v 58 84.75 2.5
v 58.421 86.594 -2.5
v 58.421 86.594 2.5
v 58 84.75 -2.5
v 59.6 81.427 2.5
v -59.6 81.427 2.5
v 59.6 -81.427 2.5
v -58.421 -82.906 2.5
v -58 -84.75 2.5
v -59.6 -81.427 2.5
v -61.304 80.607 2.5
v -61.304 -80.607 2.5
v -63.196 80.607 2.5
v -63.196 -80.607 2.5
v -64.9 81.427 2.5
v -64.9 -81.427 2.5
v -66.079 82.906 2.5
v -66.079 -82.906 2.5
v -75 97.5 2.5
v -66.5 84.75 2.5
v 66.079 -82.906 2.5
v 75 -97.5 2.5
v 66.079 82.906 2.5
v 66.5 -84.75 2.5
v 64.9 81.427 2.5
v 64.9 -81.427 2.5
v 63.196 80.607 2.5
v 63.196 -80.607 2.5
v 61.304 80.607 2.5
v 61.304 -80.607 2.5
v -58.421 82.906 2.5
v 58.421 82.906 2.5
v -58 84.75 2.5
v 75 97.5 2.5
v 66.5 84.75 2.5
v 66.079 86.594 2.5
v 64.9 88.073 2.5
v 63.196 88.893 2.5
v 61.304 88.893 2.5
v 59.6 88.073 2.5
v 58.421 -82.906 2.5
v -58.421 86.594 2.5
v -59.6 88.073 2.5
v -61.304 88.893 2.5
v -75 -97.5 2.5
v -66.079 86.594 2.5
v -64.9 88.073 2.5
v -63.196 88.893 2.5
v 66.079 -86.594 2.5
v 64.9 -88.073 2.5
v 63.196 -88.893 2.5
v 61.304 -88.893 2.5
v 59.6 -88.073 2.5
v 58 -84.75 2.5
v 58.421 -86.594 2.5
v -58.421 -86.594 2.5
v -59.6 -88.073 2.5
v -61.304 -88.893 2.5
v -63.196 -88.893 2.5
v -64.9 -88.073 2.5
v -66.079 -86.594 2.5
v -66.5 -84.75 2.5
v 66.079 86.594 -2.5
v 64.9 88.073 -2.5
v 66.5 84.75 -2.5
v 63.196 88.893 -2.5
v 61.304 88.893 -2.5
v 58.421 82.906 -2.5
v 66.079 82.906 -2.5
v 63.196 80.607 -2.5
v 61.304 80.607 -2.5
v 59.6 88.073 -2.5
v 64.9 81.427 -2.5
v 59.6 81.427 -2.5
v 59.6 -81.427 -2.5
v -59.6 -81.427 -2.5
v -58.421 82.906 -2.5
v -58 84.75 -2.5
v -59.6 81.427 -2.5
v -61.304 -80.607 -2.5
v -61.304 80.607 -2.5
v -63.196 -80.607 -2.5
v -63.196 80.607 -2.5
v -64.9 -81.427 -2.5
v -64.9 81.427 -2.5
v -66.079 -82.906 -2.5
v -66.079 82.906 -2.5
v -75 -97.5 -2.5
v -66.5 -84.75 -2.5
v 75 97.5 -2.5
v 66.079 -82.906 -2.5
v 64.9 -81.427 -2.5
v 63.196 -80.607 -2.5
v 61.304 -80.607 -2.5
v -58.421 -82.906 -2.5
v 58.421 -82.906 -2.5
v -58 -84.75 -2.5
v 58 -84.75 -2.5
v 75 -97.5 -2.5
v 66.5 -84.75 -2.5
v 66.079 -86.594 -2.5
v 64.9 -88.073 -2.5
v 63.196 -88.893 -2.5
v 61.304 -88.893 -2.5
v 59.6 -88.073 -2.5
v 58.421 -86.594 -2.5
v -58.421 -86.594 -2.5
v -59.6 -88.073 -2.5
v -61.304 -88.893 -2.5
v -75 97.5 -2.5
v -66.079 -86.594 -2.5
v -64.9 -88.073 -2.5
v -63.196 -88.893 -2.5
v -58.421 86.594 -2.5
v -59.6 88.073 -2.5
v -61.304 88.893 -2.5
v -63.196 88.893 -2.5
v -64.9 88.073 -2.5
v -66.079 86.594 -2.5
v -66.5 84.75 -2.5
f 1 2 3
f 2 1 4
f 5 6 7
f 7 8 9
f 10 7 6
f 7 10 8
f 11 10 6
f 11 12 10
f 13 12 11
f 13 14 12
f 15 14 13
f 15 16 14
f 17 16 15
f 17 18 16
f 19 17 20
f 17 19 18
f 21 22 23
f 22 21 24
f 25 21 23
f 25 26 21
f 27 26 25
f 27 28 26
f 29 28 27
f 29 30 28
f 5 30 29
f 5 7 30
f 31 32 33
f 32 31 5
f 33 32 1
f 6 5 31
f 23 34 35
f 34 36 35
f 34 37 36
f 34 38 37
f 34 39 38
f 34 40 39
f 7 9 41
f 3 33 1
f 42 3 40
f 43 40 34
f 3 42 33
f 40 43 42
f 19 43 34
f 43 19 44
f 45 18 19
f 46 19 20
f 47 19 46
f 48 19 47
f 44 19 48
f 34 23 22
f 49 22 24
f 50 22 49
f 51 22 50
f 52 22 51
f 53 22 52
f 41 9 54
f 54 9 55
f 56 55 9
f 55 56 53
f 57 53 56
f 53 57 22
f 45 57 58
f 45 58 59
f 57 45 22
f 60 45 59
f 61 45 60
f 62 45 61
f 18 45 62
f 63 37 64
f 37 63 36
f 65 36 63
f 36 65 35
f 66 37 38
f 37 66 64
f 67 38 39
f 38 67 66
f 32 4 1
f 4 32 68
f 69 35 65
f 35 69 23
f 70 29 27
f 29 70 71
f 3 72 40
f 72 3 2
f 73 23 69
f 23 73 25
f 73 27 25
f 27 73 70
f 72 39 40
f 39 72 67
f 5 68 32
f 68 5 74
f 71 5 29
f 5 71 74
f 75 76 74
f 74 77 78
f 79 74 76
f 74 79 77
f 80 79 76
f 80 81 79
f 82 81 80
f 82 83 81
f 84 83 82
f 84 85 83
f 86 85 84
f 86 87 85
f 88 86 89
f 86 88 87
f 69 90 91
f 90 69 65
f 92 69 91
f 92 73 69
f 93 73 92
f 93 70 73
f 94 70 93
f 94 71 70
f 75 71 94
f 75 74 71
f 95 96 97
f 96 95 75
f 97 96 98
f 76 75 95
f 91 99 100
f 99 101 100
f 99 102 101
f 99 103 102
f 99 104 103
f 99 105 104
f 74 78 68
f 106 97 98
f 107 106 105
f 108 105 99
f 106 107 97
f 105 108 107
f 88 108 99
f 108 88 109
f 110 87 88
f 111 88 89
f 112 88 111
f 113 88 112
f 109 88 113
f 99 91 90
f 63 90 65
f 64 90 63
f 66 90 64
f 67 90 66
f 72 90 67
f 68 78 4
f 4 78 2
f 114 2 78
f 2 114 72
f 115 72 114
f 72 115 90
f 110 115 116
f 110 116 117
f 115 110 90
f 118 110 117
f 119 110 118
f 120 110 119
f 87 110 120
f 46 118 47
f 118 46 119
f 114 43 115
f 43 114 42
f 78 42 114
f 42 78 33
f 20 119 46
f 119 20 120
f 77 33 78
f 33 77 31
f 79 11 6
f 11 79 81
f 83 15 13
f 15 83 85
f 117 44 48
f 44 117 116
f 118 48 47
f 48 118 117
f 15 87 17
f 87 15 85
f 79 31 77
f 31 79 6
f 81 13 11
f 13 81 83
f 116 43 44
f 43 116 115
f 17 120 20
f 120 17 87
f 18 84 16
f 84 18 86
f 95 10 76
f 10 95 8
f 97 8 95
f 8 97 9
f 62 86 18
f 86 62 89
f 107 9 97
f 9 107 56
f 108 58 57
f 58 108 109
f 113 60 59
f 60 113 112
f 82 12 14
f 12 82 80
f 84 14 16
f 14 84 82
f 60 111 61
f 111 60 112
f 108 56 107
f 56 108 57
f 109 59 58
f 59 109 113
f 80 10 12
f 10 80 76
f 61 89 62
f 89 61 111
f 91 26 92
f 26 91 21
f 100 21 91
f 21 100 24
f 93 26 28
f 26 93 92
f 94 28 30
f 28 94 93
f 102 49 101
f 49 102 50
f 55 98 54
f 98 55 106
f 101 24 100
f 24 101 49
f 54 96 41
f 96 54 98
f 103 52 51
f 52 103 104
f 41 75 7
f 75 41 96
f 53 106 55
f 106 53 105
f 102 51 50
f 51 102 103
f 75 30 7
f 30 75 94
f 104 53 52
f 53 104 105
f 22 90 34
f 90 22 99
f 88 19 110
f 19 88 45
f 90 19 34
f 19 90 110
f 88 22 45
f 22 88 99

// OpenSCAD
// Generated by SolidPython 1.1.3 on 2023-10-16 12:12:56


difference() {
	cube(center = true, size = [150, 195.0000000000, 5]);
	union() {
		translate(v = [62.2500000000, 84.7500000000]) {
			cylinder(center = true, h = 5, r = 4.2500000000);
		}
		translate(v = [-62.2500000000, 84.7500000000]) {
			cylinder(center = true, h = 5, r = 4.2500000000);
		}
		translate(v = [-62.2500000000, -84.7500000000]) {
			cylinder(center = true, h = 5, r = 4.2500000000);
		}
		translate(v = [62.2500000000, -84.7500000000]) {
			cylinder(center = true, h = 5, r = 4.2500000000);
		}
	}
}
/***********************************************
*********      SolidPython code:      **********
************************************************
 
import solid
import numbers
import pudb
from solid.utils import *
import viewscad
import subprocess
import os
import os.path as osp
import math
import sys

chamfer_extrude=solid.import_scad("./chamfer_extrude.scad")
chamfer_extrude=chamfer_extrude.chamfer_extrude
r = viewscad.Renderer(width=800, height=800)

def debug(model,f_name,path="/home/ts/code/projects/mfd/designs/debug"):
    solid.scad_render_to_file(model,osp.join(path,f_name)+".scad")
#generate position list of wells using offset from center
wells_pos_from_center_4 = lambda offset: [[-offset,offset],
                                        [offset, offset],
                                        [-offset, -offset],
                                        [offset, -offset]]
#wells_pos_from_center_2 = lambda offset: [[0,offset],
#                                        [0, -offset]]
wells_pos_from_center_2 = lambda offset: [[offset,0],
                                        [-offset,0]]

def make_well(dims,shape=None,height=None,dxf=False):
    def circle_cylinder():
        if dxf or (height is None):
            well = solid.circle(r=dims, segments=64)
        else:
            well = solid.cylinder(r=dims, h=height, segments=64, center = True)
        return well
    if dims is None:
        sys.exit("radius needs to be a number")
    if isinstance(dims, numbers.Number):
        well =circle_cylinder()
    elif len(dims)==1:
        if isinstance(dims[1], numbers.Number):
            well =circle_cylinder()
        else:
            sys.exit("radius needs to be a number")
    elif len(dims)==2:
        well = solid.square(dims,center = True)
    elif len(dims)==3:
        well = solid.cube(dims, center = True)
    return well

def wells_top_bottom(center_gap,device_dims=None,shape=None,height=None, positions = None, dxf = False):
    well_shape = make_well(device_dims,shape=shape,height=height,dxf=dxf)
    wells = []
    if positions is None:
        offset = radius+radius/2.0
        positions = wells_pos_from_center_2(offset)
    if dxf or (height is None):
        height = 0
    for position in positions:
        if dxf:
            wells.append(solid.translate([position[0],position[1]])(well_shape))
        else:
            wells.append(solid.translate([position[0],position[1],height/2.0])(well_shape))
    return  union()(*wells)

#place wells in four corners 
def four_corner(radius,height=None, positions = None, dxf = False):
    #if well pos not specified set
    #to equally spaced by half radius
    if positions is None:
        offset = radius+radius/2.0
        positions = wells_pos_from_center_4(offset)
    if dxf or (height is None):
        height = 0
    #make wells at positions with specified radius and height
    wells = []
    for position in positions:
        #make circle if making dxf
        if dxf:
            well_shape = solid.circle(r=radius, segments=64)
            well_shape = solid.translate([position[0],position[1]])(well_shape)
        #if stl make cylinder
        else:
            well_shape = solid.cylinder(r=radius, h=height, segments=64, center = True)
            well_shape = solid.translate([position[0],position[1],height/2.0])(well_shape)
        wells.append(well_shape)
    return  union()(*wells)

#generate channels 
def make_channels(length,width,height=0,num_chans=1,max_chans=None,spacing=None, dxf = False,
                  rotate_channels=False):
    if dxf or (height is None):
        height = 0
    #if channel gap not defined, is equal to
    if spacing is None: spacing = width
    #calculate number of channels if fitting max num within given width
    if not max_chans is None:
        import math
        num_chans = math.floor((max_chans-spacing)/(width+spacing))
    #get total width of channel section  
    total_width = (width*num_chans)+(spacing*(num_chans-1))

    #make template channel
    #if rotate_channels: width, length = length, width
    if dxf:
        channel_t = solid.square([length,width],center = True)
    else:
        channel_t = solid.cube([length,width,height], center = True)

    #if number channels is even, offset the first channel to center its gap
    if num_chans % 2 == 0: centering = -(width/2.0+spacing/2.0)
    else: centering = 0
    #move template channel up to align bottom at z = 0 
    #and offset center if necessary
    if dxf:
        channel_t = solid.translate([0,centering])(channel_t)
    else:
        channel_t = solid.translate([0,centering,height/2.0])(channel_t)

    #if rotate_channels: length,width = width,length
    #start making the channels
    channels = []
    for i in range(num_chans):
        #if i=0 there is no translation
        #if i=1, we make the first channel adjacent to second
        direction = i

        #if i>=1, we add channels alternating left and right
        if i >= 1:
            direction = -(i/2.0)
            if i % 2 == 1: direction = (-direction)+0.5
                
        #make channel at right position and add it to channel list
        translation_coords = [0,direction*(width+spacing)]
        #if rotate_channels: translation_coords = [direction*(width+spacing),0]
        if dxf:
            channel = solid.translate(translation_coords)(channel_t)
        else:
            channel = solid.translate([*translation_coords,0])(channel_t)
        channels.append(channel)
    
    #group all channels as one object
    channels = union()(*channels)
    #compute the x,y,z dimensions in order to pass as arguments 
    #for construction of other parts of device (such as the chambers)
    measurements = {'x':(length/2.0,-length/2.0),
                    'y':(total_width/2.0,-total_width/2.0)}
    if not dxf:
        measurements['z'] = (height,0)
    if rotate_channels:
        channels = solid.rotate(90)(channels)
        measurements['x'],measurements['y']=measurements['y'],measurements['x']
    return channels,measurements

def make_chambers(msrs,height=None,extra=0,len_until=None,width=None, dxf = False):
    #computes x,y,z length
    total = lambda x : abs(x[0]) + abs(x[1])
    
    #if specific height if specified
    #otherwise use same height as channels
    if dxf:
        pass
    elif not height is None:
        msrs['z'] = (height,0)
    else:
        msrs['z'] = (0,0)
        
    #make copy of measurements from channels to modify chamber dimensions 
    #and add length to chambers as specified
    chamber_dims = msrs.copy()
    #calculate length of chamber to reach specified offset
    if not len_until is None:
        chamber_len = len_until-(msrs['x'][0])
    #or add specified length to channel length (if not specified, adds 0)
    else:
        chamber_len = msrs['x'][0]+extra
    #set the chamber length based 
    chamber_dims['x'] = (chamber_len/2.0,-(chamber_len/2.0))
    #compute final dimensions of chamber
    if not width is None:
        chamber_dims['y'] = (width/2.0,-width/2.0)
    chamber_dims = [total(size) for size in chamber_dims.values()]
        
    #calculate chamber translation offset to place adjacent to channels
    chamber_trslt = msrs['x'][0]+(chamber_len/2.0)
    #compute chamber translation coordinates to align with channels
    #x = 1 moves chamber above channels
    #x = -1 moves chamber below channels
    if dxf:
        trslt = lambda x : [x*(chamber_trslt),0]
    else:
        trslt = lambda x : [x*(chamber_trslt),0,msrs['z'][0]/2.0]
    
    #function to make chamber at top or at bottom 
    if dxf:
        move = lambda x : solid.translate(trslt(x))(solid.square(chamber_dims, center = True) )
    else:
        move = lambda x : solid.translate(trslt(x))(solid.cube(chamber_dims,center = True))
    #make top and bottom chambers and return them as grouped
    top = move(1)
    bottom = move(-1)
    #chambers=solid.rotate(90)(solid.union()(top,bottom))
    chambers=(solid.union()(top,bottom))

    return chambers

#create alignment features 
def alignment_features(unit,dims,grid_size, mask_size = None, alignment = "hollow", units_from_center = (2.5,2.5), corner_len=None):
    width = grid_size[0]*dims[0]
    length = grid_size[1]*dims[1]
    if mask_size is None and corner_len is None:
        corner_len = (dims[0] + dims[1]) /2 / 8
    corner = lambda thickness_div : solid.union()( solid.square([corner_len,corner_len/thickness_div],center=False), solid.square([corner_len/thickness_div,corner_len],center=False) )
    
    def make_full(thickness_div):
        thickness = corner_len/thickness_div
        tr = solid.translate([0, 0, 0 ])(solid.rotate(180)(corner(thickness_div)))
        tr = solid.translate([thickness/2,thickness/2,0])(tr)
        bl = solid.translate([0, 0, 0 ])(solid.rotate(0)(corner(thickness_div)))
        bl = solid.translate([-thickness/2,-thickness/2,0])(bl)
        return solid.union()(tr,bl)
    
    def make_hollow(thickness_div):
        thickness = corner_len/(thickness_div/2)
        inner = make_full(thickness_div)
        outer = make_full(thickness_div/2)
        hollow = outer - inner 
        return hollow
    
    center = (width /2 , length/2)
    mask_pos = lambda x,y : (center[0] + x*(float(units_from_center[0])*dims[0]), center[1] + y*(float(units_from_center[1])*dims[1]))
    positions = []
    positions.append(mask_pos(1,0))
    positions.append(mask_pos(0,1))
    positions.append(mask_pos(-1,0))
    positions.append(mask_pos(0,-1))
    make_mask = lambda mtype : make_hollow(8) if mtype == "hollow" else make_full(8)
    masks = [ solid.translate([*position,0])(make_mask(alignment)) for position in positions]
    
    solid.scad_render_to_file(solid.union()(*masks),"./designs/open_chamber/masks.scad")
    #return unit - solid.union()(*masks)
    return solid.union()(*masks,unit)

def create_outline(thickness, array, dims, grid_size,):
    width = grid_size[0]*dims[0] + thickness *2
    length = grid_size[1]*dims[1] + thickness *2
    outer = solid.translate([-thickness, -thickness,0])(solid.square([width, length]))
    return outer-array

def create_wall(wall_thickness, outline_thickness, dims, grid_size, wall_height = 2000, dxf = False):
    inner_width = grid_size[0]*dims[0] + outline_thickness *2
    inner_length = grid_size[1]*dims[1] + outline_thickness *2
    outer_width = inner_width + wall_thickness * 2
    outer_length = inner_length + wall_thickness * 2
    outer_pos_x = -outline_thickness-wall_thickness
    outer_pos_y = -outline_thickness-wall_thickness
    inner_pos_x = -outline_thickness
    inner_pos_y = -outline_thickness
    if dxf:
        inner_wall = solid.translate([inner_pos_x,
                                      inner_pos_y,
                                      0])(solid.square([inner_width, inner_length]))
        outer_wall = solid.translate([outer_pos_x,
                                      outer_pos_y,
                                      0])(solid.square([outer_width, outer_length]))

        return outer_wall-inner_wall
    else:
        inner_wall = solid.translate([inner_pos_x,
                                      inner_pos_y,
                                      0])(solid.cube([inner_width, inner_length,wall_height]))
        outer_wall = solid.translate([outer_pos_x,
                                      outer_pos_y,
                                      0])(solid.cube([outer_width, outer_length,wall_height]))

        return outer_wall-inner_wall, {'wall_height': wall_height,
                                       'wall_thickness': wall_thickness,
                                       'inner_width':inner_width,
                                       'inner_length': inner_length,
                                       'outer_width': outer_width,
                                       'outer_length': outer_length,
                                       'outer_pos_x' : outer_pos_x,
                                       'outer_pos_y' : outer_pos_y,
                                       'inner_pos_x' : inner_pos_x,
                                       'inner_pos_y' : inner_pos_y}

def create_thicker_wall(wall_thickness, outer_wall_offset, wall_dims, dims, grid_size, height_start = .2, height_end=2, dxf = False):
    addon_wall,thicker_wall_dims = create_wall(wall_thickness, outer_wall_offset, dims, grid_size, wall_height=height_end-height_start, dxf = False)
    addon_wall = solid.translate([0,0,height_start])(addon_wall)

    thicker_wall_dims['wall_height'] = height_end
    thicker_wall_dims['wall_thickness'] = wall_dims['wall_thickness'] + wall_thickness
    return addon_wall, thicker_wall_dims
 
def add_lock_to_wall(wall,wall_dims,y_offset = 0,cut_ratio=0.7,L_length=3, gap_ratio=0.05, axis="x",width_ratio=1/2):
    # Makes L shape
    def make_L(max_length,length_thickness,max_width,width_thickness,height,y_offset):
        length = solid.cube([max_length,length_thickness,height])
        width = solid.cube([width_thickness,max_width,height])
        width = solid.translate([max_length-(width_thickness),0,0])(width)
        L = solid.union()(width,length)
        debug(L,"L")
        if axis == "x":
            L = solid.rotate(-90)(L)
            L = solid.translate([0,max_length,0])(L)
        else:
            L = solid.rotate(-180)(L)
            L = solid.translate([max_length,max_width,0])(L)
        return solid.translate([0,0,y_offset])(L)
    
    lock_length = L_length
    lock_width = wall_dims['wall_thickness']*width_ratio
    lock_length_thickness = lock_width/2
    lock_width_thickness = lock_width/2
    L_lock = make_L(lock_length,lock_length_thickness,lock_width,lock_width_thickness, wall_dims['wall_height']-y_offset, y_offset)
    
    margin_space = lock_length - lock_length*(1-gap_ratio)
    key_length = lock_length-margin_space
    key_length_thickness = lock_length_thickness-(margin_space*2)
    key_width = lock_width-(margin_space*2)
    key_width_thickness = lock_width_thickness-(margin_space*2)
    L_key = make_L(key_length,key_length_thickness,key_width,key_width_thickness, wall_dims['wall_height']-y_offset, y_offset)
    L_key = solid.translate([margin_space,margin_space,0])(L_key)
    L = solid.union()(L_lock,L_key)
    debug(L,"L")
    
    #Make cube to be used as negative to split frame in a half
    #Can choose if making left or right negative, specify ratio of split
    def make_negative(right,cut_ratio):
        if axis == "x":
            if right:
                length = wall_dims['outer_length']*(1-cut_ratio)
                pos_x = wall_dims['outer_pos_x']+(wall_dims['outer_length']*cut_ratio)
            else:
                length = wall_dims['outer_length']*(cut_ratio)
                pos_x = wall_dims['outer_pos_x'] 
            negative = solid.cube([wall_dims['outer_width'],length, wall_dims['wall_height']])
            negative = solid.translate([wall_dims['outer_pos_y'],pos_x,0])(negative)
        else:
            if right:
                length = wall_dims['outer_width']*(1-cut_ratio)
                pos_x = wall_dims['outer_pos_y']+(wall_dims['outer_width']*cut_ratio)
            else:
                length = wall_dims['outer_width']*(cut_ratio)
                pos_x = wall_dims['outer_pos_y'] 
            negative = solid.cube([length,wall_dims['outer_length'], wall_dims['wall_height']])
            negative = solid.translate([pos_x,wall_dims['outer_pos_x'],0])(negative)
        return negative, pos_x, length 
                      
    #Make negatives
    negative_right, right_half_pos_x, right_half_length = make_negative(True,cut_ratio)
    negative_left, left_half_pos_x, right_half_length = make_negative(False,cut_ratio)
    #Make halves
    left_half = solid.difference()(wall,negative_right)
    right_half = solid.difference()(wall,negative_left)
    def place_L(L, L_length,L_width):
        #Place L on top wall       
        offset_to_center = (wall_dims['wall_thickness']-L_width)/2
        if axis == "x":
            y_pos_top = (wall_dims['outer_pos_y'] +
                    wall_dims['outer_width'] - 
                    L_width - offset_to_center)
            top_L = solid.translate([y_pos_top,
                                     right_half_pos_x-(L_length),
                                     0])(L)
            #Place L on bottom wall       
            y_pos_bottom = wall_dims['outer_pos_y']+offset_to_center
            bottom_L = solid.translate([y_pos_bottom,
                                        right_half_pos_x-L_length,
                                        0])(L)
        else:
            y_pos_top = (wall_dims['outer_pos_x'] +
                    wall_dims['outer_length'] -
                    (L_width+offset_to_center))
            top_L = solid.translate([right_half_pos_x-L_length,
                                     y_pos_top,
                                     0])(L)
            #Place L on bottom wall       
            y_pos_bottom = wall_dims['outer_pos_y']+offset_to_center
            bottom_L = solid.translate([right_half_pos_x-L_length,
                                        y_pos_bottom,
                                        0])(L)
        return bottom_L, top_L
    #Make complimentary L pieces through union and differences
    #Make Lock
    bottom_L_lock, top_L_lock = place_L(L_lock,L_length,lock_width)
    left_half = solid.difference()(left_half,bottom_L_lock)
    left_half = solid.difference()(left_half,top_L_lock)
    #Make Key
    bottom_L_key, top_L_key = place_L(L_key,L_length,lock_width)
    right_half = solid.union()(right_half,bottom_L_key)
    right_half = solid.union()(right_half,top_L_key)
    return left_half, right_half


#build a row x col grid of containment units
def make_unit_array(unit,dims,grid_size, dxf = False, alignment = None, mask_size = None,
                    units_from_center = None,alignment_offset=None, alignment_mark_size=1):
    units = []
    for col in range(grid_size[1]):
        for row in range(grid_size[0]):
            if dxf:
                units.append(solid.translate([row*dims[0],col*dims[1]])(unit))
            else:
                units.append(solid.translate([row*dims[0],col*dims[1],dims[2]/2.0])(unit))
    array = solid.union()(*units)
    if (not alignment is None) and dxf:
        if not alignment_offset is None:
            array = solid.translate([alignment_offset[0],alignment_offset[1]])(array)
        array = alignment_features(array,dims, grid_size, alignment = alignment, mask_size = None, units_from_center = units_from_center,corner_len=alignment_mark_size)
        if not alignment_offset is None:
            array = solid.translate([-alignment_offset[0],-alignment_offset[1]])(array)
    return array


def make_taylor(wells_pos = wells_pos_from_center_4(2.25), well_rad = 1.5 ,
                well_height = 2, chan_w = 0.01, chan_l = 1, chan_h = 0.010 ,
                chan_gap = 0.040, max_chans = None,num_chans=100, chamber_height  = 0.100,
                columns = 1, rows = 1, chamber_len_until=2.25, add_channels = True, add_wells = True, 
                add_chambers = True, save_path = "./", alignment = None, units_from_center = 2,
                mask_size = None, render_stl = False, outline_thickness = 0.050, dxf = True,
                wall_height = 15, wall_thickness = 0.95, casing_x=9, casing_y=9, casing_z=0,rotate_units=0):

    dims = [casing_x, casing_y, casing_z]
    wells = four_corner(well_rad,well_height, dxf = dxf, positions = wells_pos)
    debug(wells,"wells")
    channels, msrs = make_channels(chan_l,chan_w,chan_h,dxf=dxf, spacing = chan_gap, max_chans=max_chans,num_chans=num_chans)
    debug(channels,"channels")
    chambers = make_chambers(msrs,dxf = dxf, height=chamber_height,len_until=chamber_len_until)
    debug(chambers,"chambers")

    #add together and render
    device_parts = []
    if add_channels:
        device_parts.append(channels)
    if add_wells:
        device_parts.append(wells)
    if add_chambers:
        device_parts.append(chambers)
    device=union()(*device_parts)
    device = rotate(rotate_units)(device)

    device=solid.translate([dims[0]/2.0,dims[1]/2.0,0])(device)
    channels = rotate(rotate_units)(channels)
    channels=solid.translate([dims[0]/2,dims[1]/2,0])(channels)
    chambers_wells = union()(wells,chambers)
    chambers_wells = rotate(rotate_units)(chambers_wells)
    chambers_wells=solid.translate([dims[0]/2,dims[1]/2,0])(chambers_wells)

    file_name = str(rows)+'x'+str(columns)+'_units_'
    grid_size = [rows,columns]

    if alignment:
        alignment="full"
    device = make_unit_array(device,dims,grid_size, dxf=dxf, alignment = alignment,
                                 units_from_center = units_from_center)
    channels = make_unit_array(channels,dims,grid_size, dxf=dxf, alignment = alignment,
                                 units_from_center = units_from_center)
    if alignment=="full":
        alignment="hollow"

    chambers_wells = make_unit_array(chambers_wells,dims,grid_size, dxf=dxf, alignment = alignment,
                                 units_from_center =units_from_center)

    def save_model(model,prefix):
        model_fname = os.path.abspath(save_path+prefix+"_"+file_name+".scad")
        solid.scad_render_to_file(model,model_fname)
        return model_fname

    wells_fname = save_model(wells,"wells")
    channels_fname = save_model(channels,"channels")
    device_fname = save_model(device,"device")
    chambers_wells_fname = save_model(chambers_wells,"chambers_wells")
    return (chambers_wells,chambers_wells_fname), (channels,channels_fname), (device,device_fname)

def make_device(design='open',rows=8,columns=6,wells_pos = 4.5,well_offset=3.2, well_rad=3.2,well_height=0.1,
                chan_l=1,chan_w=0.01,chan_h=0.01,chan_gap=0.015,num_chans=101,dxf=True,save_path="./designs/open_chamber/",
                casing_x=9.0,casing_y=18.0,casing_z=0,rotate_units=90,units_from_center=(3,1),chamber_len_until=4.5,
                chamber_width=None,alignment=True, add_wells=True, add_channels=True,add_chambers=True):

    dims = [casing_x, casing_y, casing_z]
    if design == "open":
        wells_pos=wells_pos_from_center_2(wells_pos)
        wells = wells_top_bottom(well_offset*2,device_dims=well_rad,height=well_height, dxf = dxf, positions = wells_pos)
    elif design == "closed":
        wells_pos=wells_pos_from_center_4(wells_pos)
        debug(wells,"wells")
        wells = four_corner(well_offset,well_heightdevice_dims=well_rad, dxf = dxf, positions = wells_pos)
    else:
        print(design+" is not a valid design.\n Choose valid design: 'open' or 'closed'")
        exit()
    wells = rotate(rotate_units)(wells)
    wells=solid.translate([dims[0]/2,dims[1]/2,0])(wells)
    debug(wells,"wells")

    channels, msrs = make_channels(chan_l,chan_w,chan_h,dxf=dxf, spacing = chan_gap, num_chans=num_chans,rotate_channels=False)
    channels = rotate(rotate_units)(channels)
    channels=solid.translate([dims[0]/2,dims[1]/2,0])(channels)

    chambers=make_chambers(msrs,height=None,extra=0,len_until=chamber_len_until, width=chamber_width,dxf = dxf)
    chambers = rotate(rotate_units)(chambers)
    chambers=solid.translate([dims[0]/2,dims[1]/2,0])(chambers)

    device_parts = []
    if add_channels:
        device_parts.append(channels)
    if add_wells:
        device_parts.append(wells)
    if add_chambers:
        device_parts.append(chambers)
    device = union()(*device_parts)
    #device = rotate(rotate_units)(device)
    #device=solid.translate([dims[0]/2.0,dims[1]/2.0,0])(device)

    chambers_wells = []
    if add_chambers:
        chambers_wells.append(chambers)
    if add_wells:
        chambers_wells.append(wells)
    chambers_wells = union()(*chambers_wells)
    #chambers_wells = union()(wells,chambers)
    #chambers_wells = rotate(rotate_units)(chambers_wells)
    #chambers_wells=solid.translate([dims[0]/2,dims[1]/2,0])(chambers_wells)

    file_name = str(rows)+'x'+str(columns)+'_units_'

    grid_size = [rows,columns]
    if alignment:
        alignment="full"
    device = make_unit_array(device,dims,grid_size, dxf=dxf, alignment = alignment,
                                 units_from_center = units_from_center)
    channels = make_unit_array(channels,dims,grid_size, dxf=dxf, alignment = alignment,
                                 units_from_center = units_from_center)
    if alignment=="full":
        alignment="hollow"

    chambers_wells = make_unit_array(chambers_wells,dims,grid_size, dxf=dxf, alignment = alignment,
                                 units_from_center =units_from_center)

    def save_model(model,prefix):
        model_fname = os.path.abspath(save_path+prefix+"_"+file_name+".scad")
        solid.scad_render_to_file(model,model_fname)
        return model_fname

    wells_fname = save_model(wells,"wells")
    channels_fname = save_model(channels,"channels")
    device_fname = save_model(device,"device")
    chambers_wells_fname = save_model(chambers_wells,"chambers_wells")
    return (chambers_wells,chambers_wells_fname), (channels,channels_fname), (device,device_fname)


def make_open_chamber(rows=8,columns=6,wells_pos = wells_pos_from_center_2(4.5), well_rad=3.2,well_height=0.1,
                      chan_l=1,chan_w=0.01,chan_h=0.01,chan_gap=0.015,num_chans=101,dxf=True,save_path="./designs/open_chamber/",
                      casing_x=9.0,casing_y=18.0,casing_z=0,rotate_units=90,units_from_center=(3,1),chamber_len_until=4.5,
                      chamber_width=None,alignment=True, add_wells=True, add_channels=True,add_chambers=True):

    dims = [casing_x, casing_y, casing_z]
    wells = wells_top_bottom(well_rad,height=well_height, dxf = dxf, positions = wells_pos)
    channels, msrs = make_channels(chan_l,chan_w,chan_h,dxf=dxf, spacing = chan_gap, num_chans=num_chans,rotate_channels=False)
    chambers=make_chambers(msrs,height=None,extra=0,len_until=chamber_len_until, width=chamber_width,dxf = dxf)
    debug(chambers,"chambers")
    device_parts = []
    if add_channels:
        device_parts.append(channels)
    if add_wells:
        device_parts.append(wells)
    if add_chambers:
        device_parts.append(chambers)
    device = union()(*device_parts)
    device = rotate(rotate_units)(device)
    device=solid.translate([dims[0]/2.0,dims[1]/2.0,0])(device)
    channels = rotate(rotate_units)(channels)
    channels=solid.translate([dims[0]/2,dims[1]/2,0])(channels)
    chambers_wells = union()(wells,chambers)
    chambers_wells = rotate(rotate_units)(chambers_wells)
    chambers_wells=solid.translate([dims[0]/2,dims[1]/2,0])(chambers_wells)

    file_name = str(rows)+'x'+str(columns)+'_units_'

    grid_size = [rows,columns]
    if alignment:
        alignment="full"
    device = make_unit_array(device,dims,grid_size, dxf=dxf, alignment = alignment,
                                 units_from_center = units_from_center)
    channels = make_unit_array(channels,dims,grid_size, dxf=dxf, alignment = alignment,
                                 units_from_center = units_from_center)
    if alignment=="full":
        alignment="hollow"

    chambers_wells = make_unit_array(chambers_wells,dims,grid_size, dxf=dxf, alignment = alignment,
                                 units_from_center =units_from_center)

    def save_model(model,prefix):
        model_fname = os.path.abspath(save_path+prefix+"_"+file_name+".scad")
        solid.scad_render_to_file(model,model_fname)
        return model_fname

    wells_fname = save_model(wells,"wells")
    channels_fname = save_model(channels,"channels")
    device_fname = save_model(device,"device")
    chambers_wells_fname = save_model(chambers_wells,"chambers_wells")
    return (chambers_wells,chambers_wells_fname), (channels,channels_fname), (device,device_fname)

def to_dxf(scad_path):
    dxf_path = scad_path.replace(".scad",".dxf")
    subprocess.call(["openscad", "-o", dxf_path, scad_path])
    import ezdxf
    temp_dxf = ezdxf.readfile(dxf_path)
    temp_dxf.saveas(dxf_path)

#def make_walls(diameter,thickness,grid_size,dims,height=20,segments=256,make_inner=True):
#    wafer_wall_out = solid.cylinder(r=diameter/2,h=height, segments=segments)
#    wafer_wall_in = solid.cylinder(r=(diameter/2-thickness),h=height, segments=segments)
#    wafer_wall = solid.difference()(wafer_wall_out,wafer_wall_in)
#    wafer_wall = solid.translate([grid_size[1]*dims[1]/2.0,grid_size[0]*dims[0]/2.0])(wafer_wall)
#
#    vertical_wall_length = grid_size[1]*dims[1]
#    horizontal_wall_length = grid_size[0]*dims[0]
#    vertical_wall = solid.cube([vertical_wall_length,thickness,height],center = True)
#    vertical_wall = solid.translate([vertical_wall_length/2,0,height/2])(vertical_wall)
#    horizontal_wall = solid.cube([thickness,horizontal_wall_length,height],center = True)
#    horizontal_wall = solid.translate([0,vertical_wall_length/2,height/2])(horizontal_wall)
#    walls = []
#    walls.append(horizontal_wall)
#    walls.append(vertical_wall)
#    for col in range(grid_size[1]):
#        if col == grid_size[1]-1: 
#            walls.append(solid.translate([0,(col+1)*dims[1]])(vertical_wall))
#        elif col > 0 and col < grid_size[1]-1 and make_inner==True:
#            walls.append(solid.translate([0,(col+1)*dims[1]])(vertical_wall))
#    for row in range(grid_size[0]):
#        if row == grid_size[0]-1: 
#            walls.append(solid.translate([(row+1)*dims[0],0])(horizontal_wall))
#        elif row > 0 and row < grid_size[0]-1 and make_inner==True:
#            walls.append(solid.translate([(row+1)*dims[0],0])(horizontal_wall))
#    walls = union()(*walls)
#    wafer_walls = union()(walls,wafer_wall)
#    return walls,wafer_wall,wafer_walls

def make_walls(diameter,thickness,grid_size,dims,height=20,segments=256,make_inner=True,padx=0,pady=0):
    wafer_wall_out = solid.cylinder(r=diameter/2,h=height, segments=segments)
    wafer_wall_in = solid.cylinder(r=(diameter/2-thickness),h=height, segments=segments)
    wafer_wall = solid.difference()(wafer_wall_out,wafer_wall_in)
    wafer_wall = solid.translate([grid_size[1]*dims[1]/2.0,grid_size[0]*dims[0]/2.0])(wafer_wall)

    vertical_wall_length = grid_size[0]*dims[0]+padx
    horizontal_wall_length = grid_size[1]*dims[1]+pady
    vertical_wall = solid.cube([vertical_wall_length,thickness,height],center = True)
    vertical_wall = solid.translate([vertical_wall_length/2-pady/2,-padx/2,height/2])(vertical_wall)
    horizontal_wall = solid.cube([thickness,horizontal_wall_length,height],center = True)
    horizontal_wall = solid.translate([-pady/2,horizontal_wall_length/2-padx/2,height/2])(horizontal_wall)
    walls = []
    walls.append(horizontal_wall)
    walls.append(vertical_wall)
    for col in range(grid_size[1]):
        if col == grid_size[1]-1: 
            walls.append(solid.translate([0,(col+1)*dims[1]+pady])(vertical_wall))
        elif col > 0 and col < grid_size[1]-1 and make_inner==True:
            walls.append(solid.translate([0,(col+1)*dims[1]])(vertical_wall))
    for row in range(grid_size[0]):
        if row == grid_size[0]-1: 
            walls.append(solid.translate([(row+1)*dims[0]+padx,0])(horizontal_wall))
        elif row > 0 and row < grid_size[0]-1 and make_inner==True:
            walls.append(solid.translate([(row+1)*dims[0],0])(horizontal_wall))
    walls = union()(*walls)
    wafer_walls = union()(walls,wafer_wall)
    return walls,wafer_wall,wafer_walls

def save_model(model,base_path,base_name,dxf=True):
    if not os.path.exists(base_path):
        os.makedirs(base_path)
    dxf_path=osp.join(base_path,base_name+".scad")
    solid.scad_render_to_file(model,osp.join(dxf_path))
    if dxf:
        to_dxf(dxf_path)

def make_wafer(diameter,flat_len,thickness):
    wafer = solid.cylinder(r1=diameter/2,r2=diameter/2,h=thickness,segments=512,)()
    x_start_flat=(flat_len/2)
    y_start_flat = math.sqrt(((diameter/2)**2) - (x_start_flat**2) )
    height_delete_flat=diameter/2-y_start_flat
    flat_delete = solid.cube([flat_len,height_delete_flat,thickness],center=False)()
    flat_delete = solid.translate([-flat_len/2,y_start_flat,0])(flat_delete)
    wafer = solid.difference()(wafer,flat_delete)
    wafer = solid.rotate(90)(wafer)
    return wafer

def add_wafer_to_mask(wafer_size,flat_len,mask,grid_size,dims,wafer_line_thickness=0.1,outer_mask_thickness=5,alignment_offset=None):
    def make_wafer_mask(wafer_size,flat_len):
        wafer_mask = make_wafer(wafer_size,flat_len,1)
        wafer_mask = solid.projection()(wafer_mask)
        wafer_mask = solid.translate([grid_size[0]*dims[0]/2.0,grid_size[1]*dims[1]/2.0])(wafer_mask)
        if not alignment_offset is None:
            wafer_mask = solid.translate([-alignment_offset[0],-alignment_offset[1]])(wafer_mask)
        return wafer_mask

    inner_wafer_line_mask = make_wafer_mask(wafer_size-wafer_line_thickness/2,flat_len)
    outer_wafer_line_mask = make_wafer_mask(wafer_size+wafer_line_thickness/2,flat_len)
    outer_wafer_mask = make_wafer_mask(wafer_size+outer_mask_thickness,flat_len)
    outer_wafer_mask = solid.difference()(outer_wafer_mask,outer_wafer_line_mask)
    wafer_mask = solid.union()(outer_wafer_mask,inner_wafer_line_mask)

    return solid.difference()(wafer_mask,mask)

def make_posts(post_shape,post_height):
    posts = solid.linear_extrude(height=post_height)(post_shape)
    return posts

def make_wafer_empty(diameter,flat_len,thickness,margin,notch_len=20,notch_height=5,oversize=1.01):
    diameter*=oversize
    flat_len*=oversize
    wafer = make_wafer(diameter,flat_len,thickness)
    holder = solid.cylinder(r1=diameter/2+margin,r2=diameter/2+margin,h=thickness,segments=512)()
    holder = solid.difference()(holder,wafer)

    x_start_flat=(flat_len/2)
    y_start_flat = math.sqrt(((diameter/2)**2) - (x_start_flat**2) )
    height_delete_flat=diameter/2-y_start_flat
    notch = solid.cube([notch_len,notch_height,thickness],center=False)()
    notch = solid.translate([-notch_len/2,y_start_flat,0])(notch)
    notch = solid.rotate(90)(notch)
    return solid.difference()(holder,notch)

def wafer_print_calibration(diameter,thickness,height,z_offset):
    circles = []
    radii = []
    radii.append(diameter/2.0*0.8)
    radii.append(diameter/2.0*0.6)
    radii.append(diameter/2.0*0.4)
    radii.append(diameter/2.0*0.2)
    for radius in radii:
        inner = solid.cylinder(r1=radius-(thickness/2.0),r2=radius-(thickness/2.0),h=thickness,segments=512,)()
        outer = solid.cylinder(r1=radius+(thickness/2.0),r2=radius+(thickness/2.0),h=thickness,segments=512,)()
        diff = solid.difference()(outer,inner)
        circles.append(diff)
    circles = solid.union()(*circles)
    circles = solid.translate([0,0,z_offset])(circles)
    return circles

def make_rack(wells,dims,grid_size,alignment_offset,rack_x,rack_y,rack_thickness,bolt_width,add_bolts=True):

    #get X and Y dimensions of gride of pipette tips
    X_len = dims[0]*grid_size[0]
    Y_len = dims[1]*grid_size[1]
    #make rack
    rack = solid.cube([rack_x,rack_y,rack_thickness],center=True)

    if add_bolts:
    #add bolt holes
        bolt_hole=solid.cylinder(r=bolt_width/2,h=rack_thickness,center=True)()
        bolt_holes = []
        bolt_holes.append(solid.translate([rack_x/2-1.5*bolt_width,rack_y/2-1.5*bolt_width])(bolt_hole))
        bolt_holes.append(solid.translate([-rack_x/2+1.5*bolt_width,rack_y/2-1.5*bolt_width])(bolt_hole))
        bolt_holes.append(solid.translate([-rack_x/2+1.5*bolt_width,-rack_y/2+1.5*bolt_width])(bolt_hole))
        bolt_holes.append(solid.translate([rack_x/2-1.5*bolt_width,-rack_y/2+1.5*bolt_width])(bolt_hole))
        bolt_holes = solid.union()(*bolt_holes)
        rack=solid.difference()(rack,bolt_holes)
    rack_support = rack

    #center rack with pipette holes
    rack = solid.translate([0,0,rack_thickness/2])(rack)
    rack = solid.translate([X_len/2,Y_len/2])(rack)
    rack = solid.translate([-alignment_offset[0],-alignment_offset[1]])(rack)
    wells = solid.linear_extrude(height=rack_thickness)(wells)
    rack = solid.difference()(rack,wells)
    return rack, rack_support

def make_pillar(wells,dims,grid_size,alignment_offset,rack_x,rack_y,pillar_height,rack_thickness,bolt_width,add_bolts=True,taper_angle=1,bolt_position_corner=1.5):

    #get X and Y dimensions of gride of pipette tips
    X_len = dims[0]*grid_size[0]
    Y_len = dims[1]*grid_size[1]
    #make rack
    rack = solid.cube([rack_x,rack_y,rack_thickness],center=True)
    
    if add_bolts:
    #add bolt holes
        bolt_hole=solid.cylinder(r=bolt_width/2,h=rack_thickness,center=True)()
        bolt_holes = []
        bolt_holes.append(solid.translate([rack_x/2-bolt_position_corner*bolt_width,rack_y/2-bolt_position_corner*bolt_width])(bolt_hole))
        bolt_holes.append(solid.translate([-rack_x/2+bolt_position_corner*bolt_width,rack_y/2-bolt_position_corner*bolt_width])(bolt_hole))
        bolt_holes.append(solid.translate([-rack_x/2+bolt_position_corner*bolt_width,-rack_y/2+bolt_position_corner*bolt_width])(bolt_hole))
        bolt_holes.append(solid.translate([rack_x/2-bolt_position_corner*bolt_width,-rack_y/2+bolt_position_corner*bolt_width])(bolt_hole))
        bolt_holes = solid.union()(*bolt_holes)
        rack=solid.difference()(rack,bolt_holes)
    rack_support = rack

    #center rack with pipette holes
    #rack = solid.translate([0,0,-rack_thickness])(rack)
    rack = solid.translate([X_len/2,Y_len/2])(rack)
    rack = solid.translate([-alignment_offset[0],-alignment_offset[1]])(rack)
    if not taper_angle == 0:
        wells=chamfer_extrude(pillar_height,taper_angle,segments=20)(wells)
    else:
        wells = solid.linear_extrude(height=pillar_height)(wells)
    rack = solid.union()(rack,wells)
    return rack, rack_support

def deg_taper_len(height,deg):
    if not deg == 0:
        return height*math.tan(math.radians(deg))
    else:
        return 0









 
 
************************************************/
